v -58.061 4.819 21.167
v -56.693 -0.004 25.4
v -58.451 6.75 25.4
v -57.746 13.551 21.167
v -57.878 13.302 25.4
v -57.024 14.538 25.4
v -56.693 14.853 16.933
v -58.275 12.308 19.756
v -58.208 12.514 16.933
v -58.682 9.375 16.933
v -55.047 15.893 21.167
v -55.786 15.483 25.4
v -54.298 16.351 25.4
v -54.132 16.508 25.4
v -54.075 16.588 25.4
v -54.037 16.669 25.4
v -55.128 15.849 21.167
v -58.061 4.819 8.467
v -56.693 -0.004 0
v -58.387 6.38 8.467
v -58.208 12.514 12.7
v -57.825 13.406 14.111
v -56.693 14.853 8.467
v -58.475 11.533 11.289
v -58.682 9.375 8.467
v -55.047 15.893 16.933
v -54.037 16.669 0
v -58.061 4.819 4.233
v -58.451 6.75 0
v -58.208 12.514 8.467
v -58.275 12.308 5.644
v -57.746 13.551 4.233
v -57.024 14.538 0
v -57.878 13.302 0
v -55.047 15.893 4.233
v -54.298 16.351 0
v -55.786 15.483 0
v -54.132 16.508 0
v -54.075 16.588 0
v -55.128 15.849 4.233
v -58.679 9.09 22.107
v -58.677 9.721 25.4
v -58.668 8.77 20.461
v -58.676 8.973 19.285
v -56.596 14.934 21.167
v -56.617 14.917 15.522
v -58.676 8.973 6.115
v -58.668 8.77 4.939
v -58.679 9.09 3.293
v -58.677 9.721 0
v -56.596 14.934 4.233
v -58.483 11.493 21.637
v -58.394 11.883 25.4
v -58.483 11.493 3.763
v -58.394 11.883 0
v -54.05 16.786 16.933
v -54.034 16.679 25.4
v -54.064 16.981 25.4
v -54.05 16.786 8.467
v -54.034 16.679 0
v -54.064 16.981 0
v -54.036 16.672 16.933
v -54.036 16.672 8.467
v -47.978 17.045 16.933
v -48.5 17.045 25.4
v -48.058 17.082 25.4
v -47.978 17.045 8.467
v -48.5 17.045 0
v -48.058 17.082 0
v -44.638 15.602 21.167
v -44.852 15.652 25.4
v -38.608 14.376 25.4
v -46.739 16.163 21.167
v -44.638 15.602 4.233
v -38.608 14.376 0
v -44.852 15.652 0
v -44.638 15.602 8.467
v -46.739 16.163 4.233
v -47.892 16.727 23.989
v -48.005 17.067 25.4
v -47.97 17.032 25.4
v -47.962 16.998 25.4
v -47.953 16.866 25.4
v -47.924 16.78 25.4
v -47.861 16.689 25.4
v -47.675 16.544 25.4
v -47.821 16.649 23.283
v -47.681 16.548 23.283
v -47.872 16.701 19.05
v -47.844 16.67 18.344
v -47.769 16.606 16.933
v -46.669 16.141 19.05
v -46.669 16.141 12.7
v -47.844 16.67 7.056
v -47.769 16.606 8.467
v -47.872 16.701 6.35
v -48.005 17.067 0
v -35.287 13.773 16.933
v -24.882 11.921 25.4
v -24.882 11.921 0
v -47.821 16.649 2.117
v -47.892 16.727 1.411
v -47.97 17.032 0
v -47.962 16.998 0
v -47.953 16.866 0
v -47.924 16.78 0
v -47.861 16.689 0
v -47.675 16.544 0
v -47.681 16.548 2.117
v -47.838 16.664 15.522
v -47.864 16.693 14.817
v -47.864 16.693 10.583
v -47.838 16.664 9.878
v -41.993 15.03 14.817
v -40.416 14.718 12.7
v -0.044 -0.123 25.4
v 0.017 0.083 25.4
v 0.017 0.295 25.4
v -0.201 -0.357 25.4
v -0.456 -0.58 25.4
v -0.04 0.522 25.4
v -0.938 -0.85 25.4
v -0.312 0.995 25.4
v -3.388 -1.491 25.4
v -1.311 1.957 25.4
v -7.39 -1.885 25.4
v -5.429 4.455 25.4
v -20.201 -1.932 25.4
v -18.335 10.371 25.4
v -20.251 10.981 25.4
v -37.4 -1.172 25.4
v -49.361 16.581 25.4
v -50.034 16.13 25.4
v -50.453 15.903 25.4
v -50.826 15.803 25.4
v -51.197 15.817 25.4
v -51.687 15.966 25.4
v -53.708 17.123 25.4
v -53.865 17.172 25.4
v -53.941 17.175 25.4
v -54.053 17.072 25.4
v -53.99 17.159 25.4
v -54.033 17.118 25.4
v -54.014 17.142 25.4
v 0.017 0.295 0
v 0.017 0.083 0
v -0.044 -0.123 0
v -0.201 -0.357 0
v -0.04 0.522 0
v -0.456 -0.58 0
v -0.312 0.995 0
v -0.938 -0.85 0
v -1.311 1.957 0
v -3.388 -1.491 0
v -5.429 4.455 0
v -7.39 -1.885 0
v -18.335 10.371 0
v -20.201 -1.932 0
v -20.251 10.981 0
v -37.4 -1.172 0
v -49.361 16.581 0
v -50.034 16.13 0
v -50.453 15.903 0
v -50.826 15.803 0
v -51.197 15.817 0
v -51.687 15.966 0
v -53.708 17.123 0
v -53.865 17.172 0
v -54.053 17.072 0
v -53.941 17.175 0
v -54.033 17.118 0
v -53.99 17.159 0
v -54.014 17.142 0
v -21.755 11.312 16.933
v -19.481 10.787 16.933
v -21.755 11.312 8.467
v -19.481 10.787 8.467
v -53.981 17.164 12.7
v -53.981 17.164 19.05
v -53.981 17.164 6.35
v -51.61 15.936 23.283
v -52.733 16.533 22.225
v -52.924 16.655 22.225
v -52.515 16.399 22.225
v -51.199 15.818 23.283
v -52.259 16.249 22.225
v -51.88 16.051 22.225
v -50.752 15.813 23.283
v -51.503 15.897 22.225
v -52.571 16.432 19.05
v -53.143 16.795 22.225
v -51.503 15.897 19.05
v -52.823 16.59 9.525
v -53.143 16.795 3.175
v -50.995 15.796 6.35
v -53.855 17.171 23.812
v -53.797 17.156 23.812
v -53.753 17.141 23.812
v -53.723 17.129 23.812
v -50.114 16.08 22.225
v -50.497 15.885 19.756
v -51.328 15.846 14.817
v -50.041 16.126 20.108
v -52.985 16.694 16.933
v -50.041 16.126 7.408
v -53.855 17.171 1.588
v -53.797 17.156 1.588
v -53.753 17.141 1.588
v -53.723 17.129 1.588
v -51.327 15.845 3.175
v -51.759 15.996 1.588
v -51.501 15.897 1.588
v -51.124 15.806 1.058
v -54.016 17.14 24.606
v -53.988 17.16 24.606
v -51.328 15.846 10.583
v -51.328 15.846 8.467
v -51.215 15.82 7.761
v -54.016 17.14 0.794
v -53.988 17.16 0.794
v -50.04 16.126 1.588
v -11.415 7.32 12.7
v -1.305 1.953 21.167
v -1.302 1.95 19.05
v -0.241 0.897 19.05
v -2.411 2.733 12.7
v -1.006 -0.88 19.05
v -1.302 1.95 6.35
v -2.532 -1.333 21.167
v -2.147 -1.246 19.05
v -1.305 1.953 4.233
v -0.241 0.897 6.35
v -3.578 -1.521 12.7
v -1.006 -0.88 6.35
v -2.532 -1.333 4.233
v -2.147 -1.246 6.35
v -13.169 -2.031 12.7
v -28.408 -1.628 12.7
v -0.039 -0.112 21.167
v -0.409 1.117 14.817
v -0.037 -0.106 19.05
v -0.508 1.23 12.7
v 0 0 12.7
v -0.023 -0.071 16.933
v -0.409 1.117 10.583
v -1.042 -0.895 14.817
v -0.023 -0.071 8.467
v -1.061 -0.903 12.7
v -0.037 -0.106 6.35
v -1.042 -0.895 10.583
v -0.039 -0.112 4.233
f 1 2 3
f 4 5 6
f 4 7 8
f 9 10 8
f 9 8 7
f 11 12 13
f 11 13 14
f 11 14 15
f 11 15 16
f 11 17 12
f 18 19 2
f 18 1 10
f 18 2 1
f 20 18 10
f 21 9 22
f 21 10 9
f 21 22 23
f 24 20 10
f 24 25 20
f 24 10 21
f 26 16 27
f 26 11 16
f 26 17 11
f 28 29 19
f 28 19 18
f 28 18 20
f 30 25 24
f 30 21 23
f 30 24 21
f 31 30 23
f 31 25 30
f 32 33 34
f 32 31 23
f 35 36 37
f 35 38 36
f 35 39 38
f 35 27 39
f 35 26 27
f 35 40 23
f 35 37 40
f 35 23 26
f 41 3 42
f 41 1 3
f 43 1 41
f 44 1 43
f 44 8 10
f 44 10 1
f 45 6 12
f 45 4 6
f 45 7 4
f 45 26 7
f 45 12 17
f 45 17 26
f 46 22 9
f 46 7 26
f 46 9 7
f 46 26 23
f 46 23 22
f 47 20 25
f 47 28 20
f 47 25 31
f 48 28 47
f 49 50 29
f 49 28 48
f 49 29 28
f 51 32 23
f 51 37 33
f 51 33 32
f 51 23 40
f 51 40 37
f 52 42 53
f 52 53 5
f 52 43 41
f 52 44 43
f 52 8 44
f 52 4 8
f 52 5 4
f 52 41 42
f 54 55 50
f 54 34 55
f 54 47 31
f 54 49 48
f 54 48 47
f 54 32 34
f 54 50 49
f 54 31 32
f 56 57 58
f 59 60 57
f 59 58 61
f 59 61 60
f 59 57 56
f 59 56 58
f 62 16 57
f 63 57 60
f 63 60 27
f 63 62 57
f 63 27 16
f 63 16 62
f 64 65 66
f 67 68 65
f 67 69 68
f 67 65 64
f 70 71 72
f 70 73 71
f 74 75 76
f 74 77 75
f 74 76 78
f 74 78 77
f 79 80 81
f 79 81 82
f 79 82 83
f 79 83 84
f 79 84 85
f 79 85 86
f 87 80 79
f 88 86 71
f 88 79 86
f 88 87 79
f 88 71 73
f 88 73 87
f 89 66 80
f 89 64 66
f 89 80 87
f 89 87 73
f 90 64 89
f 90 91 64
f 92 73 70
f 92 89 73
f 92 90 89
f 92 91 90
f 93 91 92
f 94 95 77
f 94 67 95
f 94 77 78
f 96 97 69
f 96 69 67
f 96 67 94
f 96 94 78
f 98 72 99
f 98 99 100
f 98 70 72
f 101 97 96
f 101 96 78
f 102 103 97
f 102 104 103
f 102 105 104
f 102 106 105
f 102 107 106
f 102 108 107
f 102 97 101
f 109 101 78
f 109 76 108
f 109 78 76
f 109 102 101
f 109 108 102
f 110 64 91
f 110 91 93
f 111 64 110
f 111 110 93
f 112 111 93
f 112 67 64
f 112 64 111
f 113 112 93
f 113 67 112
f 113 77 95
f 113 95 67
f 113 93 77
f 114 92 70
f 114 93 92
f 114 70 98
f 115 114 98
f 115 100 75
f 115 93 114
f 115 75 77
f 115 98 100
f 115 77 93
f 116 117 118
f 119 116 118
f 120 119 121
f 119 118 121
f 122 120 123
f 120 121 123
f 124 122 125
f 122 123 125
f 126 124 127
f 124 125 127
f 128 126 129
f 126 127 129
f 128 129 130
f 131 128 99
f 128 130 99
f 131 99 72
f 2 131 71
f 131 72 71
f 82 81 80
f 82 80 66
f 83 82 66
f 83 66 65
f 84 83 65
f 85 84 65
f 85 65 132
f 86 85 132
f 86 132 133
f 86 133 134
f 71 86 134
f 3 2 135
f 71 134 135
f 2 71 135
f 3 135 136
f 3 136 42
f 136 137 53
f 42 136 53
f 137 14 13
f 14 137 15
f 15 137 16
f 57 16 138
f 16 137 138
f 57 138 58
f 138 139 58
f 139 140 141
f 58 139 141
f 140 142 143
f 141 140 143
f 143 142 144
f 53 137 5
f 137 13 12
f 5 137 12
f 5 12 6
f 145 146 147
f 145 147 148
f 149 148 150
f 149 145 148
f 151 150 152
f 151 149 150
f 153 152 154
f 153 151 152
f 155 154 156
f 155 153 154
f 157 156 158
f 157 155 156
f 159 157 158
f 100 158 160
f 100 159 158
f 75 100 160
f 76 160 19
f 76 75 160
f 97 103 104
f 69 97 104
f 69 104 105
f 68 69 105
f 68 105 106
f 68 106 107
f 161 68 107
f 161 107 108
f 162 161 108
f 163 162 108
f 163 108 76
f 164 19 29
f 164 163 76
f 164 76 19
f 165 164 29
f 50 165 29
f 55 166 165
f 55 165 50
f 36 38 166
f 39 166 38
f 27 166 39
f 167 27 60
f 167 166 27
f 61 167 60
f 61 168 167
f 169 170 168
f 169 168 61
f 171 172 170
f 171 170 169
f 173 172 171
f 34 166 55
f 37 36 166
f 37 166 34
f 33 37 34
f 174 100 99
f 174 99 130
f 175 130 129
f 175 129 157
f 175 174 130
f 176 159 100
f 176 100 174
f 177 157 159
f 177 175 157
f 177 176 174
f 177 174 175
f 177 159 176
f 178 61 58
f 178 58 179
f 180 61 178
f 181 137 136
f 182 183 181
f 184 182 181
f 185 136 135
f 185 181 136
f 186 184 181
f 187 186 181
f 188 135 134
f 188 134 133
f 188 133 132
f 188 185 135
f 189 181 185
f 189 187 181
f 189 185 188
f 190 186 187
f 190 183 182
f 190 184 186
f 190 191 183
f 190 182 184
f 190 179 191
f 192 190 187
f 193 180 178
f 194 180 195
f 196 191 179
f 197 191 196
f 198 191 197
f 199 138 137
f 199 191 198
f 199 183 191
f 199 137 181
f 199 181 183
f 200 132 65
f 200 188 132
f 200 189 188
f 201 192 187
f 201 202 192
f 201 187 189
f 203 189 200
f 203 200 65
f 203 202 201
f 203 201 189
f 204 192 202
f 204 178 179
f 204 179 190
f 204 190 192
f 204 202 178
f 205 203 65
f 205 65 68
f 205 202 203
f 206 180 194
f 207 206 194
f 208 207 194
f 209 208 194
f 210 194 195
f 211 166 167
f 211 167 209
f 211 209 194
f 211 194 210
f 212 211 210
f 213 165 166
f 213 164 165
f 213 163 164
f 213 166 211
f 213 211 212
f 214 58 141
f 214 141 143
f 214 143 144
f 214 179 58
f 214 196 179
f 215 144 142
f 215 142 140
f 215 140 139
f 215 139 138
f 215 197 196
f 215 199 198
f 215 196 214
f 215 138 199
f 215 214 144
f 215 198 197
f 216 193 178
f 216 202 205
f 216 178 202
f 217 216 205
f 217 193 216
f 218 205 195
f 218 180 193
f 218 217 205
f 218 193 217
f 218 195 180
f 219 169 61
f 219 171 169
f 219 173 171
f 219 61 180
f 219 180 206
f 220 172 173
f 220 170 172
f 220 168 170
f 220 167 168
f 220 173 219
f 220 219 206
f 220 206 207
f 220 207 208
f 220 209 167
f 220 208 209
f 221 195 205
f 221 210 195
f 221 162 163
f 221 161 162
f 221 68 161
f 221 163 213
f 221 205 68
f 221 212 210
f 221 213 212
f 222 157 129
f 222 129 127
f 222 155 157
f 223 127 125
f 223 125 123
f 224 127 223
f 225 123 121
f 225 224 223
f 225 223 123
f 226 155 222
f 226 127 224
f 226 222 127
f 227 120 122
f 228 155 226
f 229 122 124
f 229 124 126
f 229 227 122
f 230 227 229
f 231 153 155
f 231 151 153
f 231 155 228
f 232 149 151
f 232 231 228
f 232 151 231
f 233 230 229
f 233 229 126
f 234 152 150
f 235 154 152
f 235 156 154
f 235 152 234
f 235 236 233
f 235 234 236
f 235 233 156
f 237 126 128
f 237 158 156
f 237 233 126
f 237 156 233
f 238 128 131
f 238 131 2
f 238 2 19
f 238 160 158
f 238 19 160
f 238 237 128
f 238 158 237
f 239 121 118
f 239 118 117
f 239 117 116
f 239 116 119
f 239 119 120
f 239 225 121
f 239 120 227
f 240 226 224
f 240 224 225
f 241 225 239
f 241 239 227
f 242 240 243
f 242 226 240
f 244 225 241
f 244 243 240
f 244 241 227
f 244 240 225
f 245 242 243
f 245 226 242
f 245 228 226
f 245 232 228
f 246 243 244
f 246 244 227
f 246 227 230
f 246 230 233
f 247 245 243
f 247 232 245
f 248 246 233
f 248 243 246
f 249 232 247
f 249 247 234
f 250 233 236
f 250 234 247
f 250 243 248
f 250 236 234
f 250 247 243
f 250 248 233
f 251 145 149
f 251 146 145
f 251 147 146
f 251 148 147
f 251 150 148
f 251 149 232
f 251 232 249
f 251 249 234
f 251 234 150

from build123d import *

# Parameters (mm, degrees)
F1_DEPTH = 25.4


with BuildPart() as f1:
    # F0 (on Top) → F1 (new body)
    with BuildSketch(Plane.XY):
        with BuildLine():
            add(Edge.make_bspline(
                [(-56.692799881, -0.0036726283), (-57.6886849621, 3.2406589588), (-59.4558836953, 9.0147803753), (-57.6335925474, 15.1716527815), (-54.2150090511, 16.1434428045), (-54.0374711329, 16.6685893238)],
                knots=[0, 0, 0, 0, 0.3642219407, 0.6481921445, 0.8580895209, 0.8580895209, 0.8580895209, 0.8580895209], degree=3))
            add(Edge.make_bspline(
                [(-18.3346489125, 10.3707137249), (-8.8863715899, 6.2547101865), (16.0703166253, -4.5953287781), (-28.8114906143, -1.7561958357), (-56.692799881, -0.0036726283)],
                knots=[0, 0, 0, 0, 0.3787092952, 1, 1, 1, 1], degree=3))
            add(Edge.make_bspline(
                [(-24.8820025145, 11.9214665673), (-22.0855730218, 11.0824777116), (-19.7342558688, 10.4620045553), (-18.3346489125, 10.3707137249)],
                knots=[0.7425998676, 0.7425998676, 0.7425998676, 0.7425998676, 0.8629450751, 0.8629450751, 0.8629450751, 0.8629450751], degree=3))
            add(Edge.make_bspline(
                [(-48.5003830651, 17.0450448134), (-48.2662958708, 17.0810595282), (-47.8080860608, 17.1514673656), (-48.6598579026, 15.8675494941), (-33.1215542234, 13.4529388682), (-24.8820025145, 11.9214665673)],
                knots=[0, 0, 0, 0, 0.0967133823, 0.1899643894, 0.7066865652, 0.7066865652, 0.7066865652, 0.7066865652], degree=3))
            add(Edge.make_bspline(
                [(-54.0643529306, 16.9809556211), (-54.0630720504, 17.0360204594), (-54.0351601992, 17.1895166337), (-53.5608966685, 17.2210881333), (-50.7884631469, 14.896841086), (-49.678037834, 16.5456728688), (-48.5003830651, 17.0450448134)],
                knots=[0.034165961, 0.034165961, 0.034165961, 0.034165961, 0.0557701507, 0.1049031527, 0.2510534482, 0.3804151484, 0.3804151484, 0.3804151484, 0.3804151484], degree=3))
            add(Edge.make_bspline(
                [(-54.0341979894, 16.678756619), (-54.0044907399, 16.7759091238), (-54.0185643259, 16.8770043639), (-54.0643529306, 16.9809556211)],
                knots=[0.8594422377, 0.8594422377, 0.8594422377, 0.8594422377, 0.8981650761, 0.8981650761, 0.8981650761, 0.8981650761], degree=3))
            add(Edge.make_bspline(
                [(-54.0374711329, 16.6685893238), (-54.0363269617, 16.6719737136), (-54.0352357619, 16.6753627606), (-54.0341979894, 16.678756619)],
                knots=[0.8580895209, 0.8580895209, 0.8580895209, 0.8580895209, 0.8594422377, 0.8594422377, 0.8594422377, 0.8594422377], degree=3))
        make_face()
        with BuildLine():
            add(Edge.make_bspline(
                [(-24.8820025145, 11.9214665673), (-22.0855730218, 11.0824777116), (-19.7342558688, 10.4620045553), (-18.3346489125, 10.3707137249)],
                knots=[0.7425998676, 0.7425998676, 0.7425998676, 0.7425998676, 0.8629450751, 0.8629450751, 0.8629450751, 0.8629450751], degree=3))
            add(Edge.make_bspline(
                [(-24.8820025145, 11.9214665673), (-21.4192914248, 11.277857994), (-18.8261043501, 10.7250289492), (-18.3346489125, 10.3707137249)],
                knots=[0.7066865652, 0.7066865652, 0.7066865652, 0.7066865652, 0.9238415357, 0.9238415357, 0.9238415357, 0.9238415357], degree=3))
        make_face()
        with BuildLine():
            add(Edge.make_bspline(
                [(-54.0341979894, 16.678756619), (-54.0502875491, 16.7863208315), (-54.0663785796, 16.8938732942), (-54.0643529306, 16.9809556211)],
                knots=[0, 0, 0, 0, 0.034165961, 0.034165961, 0.034165961, 0.034165961], degree=3))
            add(Edge.make_bspline(
                [(-54.0341979894, 16.678756619), (-54.0044907399, 16.7759091238), (-54.0185643259, 16.8770043639), (-54.0643529306, 16.9809556211)],
                knots=[0.8594422377, 0.8594422377, 0.8594422377, 0.8594422377, 0.8981650761, 0.8981650761, 0.8981650761, 0.8981650761], degree=3))
        make_face()
    extrude(amount=F1_DEPTH)


solid = f1.part
